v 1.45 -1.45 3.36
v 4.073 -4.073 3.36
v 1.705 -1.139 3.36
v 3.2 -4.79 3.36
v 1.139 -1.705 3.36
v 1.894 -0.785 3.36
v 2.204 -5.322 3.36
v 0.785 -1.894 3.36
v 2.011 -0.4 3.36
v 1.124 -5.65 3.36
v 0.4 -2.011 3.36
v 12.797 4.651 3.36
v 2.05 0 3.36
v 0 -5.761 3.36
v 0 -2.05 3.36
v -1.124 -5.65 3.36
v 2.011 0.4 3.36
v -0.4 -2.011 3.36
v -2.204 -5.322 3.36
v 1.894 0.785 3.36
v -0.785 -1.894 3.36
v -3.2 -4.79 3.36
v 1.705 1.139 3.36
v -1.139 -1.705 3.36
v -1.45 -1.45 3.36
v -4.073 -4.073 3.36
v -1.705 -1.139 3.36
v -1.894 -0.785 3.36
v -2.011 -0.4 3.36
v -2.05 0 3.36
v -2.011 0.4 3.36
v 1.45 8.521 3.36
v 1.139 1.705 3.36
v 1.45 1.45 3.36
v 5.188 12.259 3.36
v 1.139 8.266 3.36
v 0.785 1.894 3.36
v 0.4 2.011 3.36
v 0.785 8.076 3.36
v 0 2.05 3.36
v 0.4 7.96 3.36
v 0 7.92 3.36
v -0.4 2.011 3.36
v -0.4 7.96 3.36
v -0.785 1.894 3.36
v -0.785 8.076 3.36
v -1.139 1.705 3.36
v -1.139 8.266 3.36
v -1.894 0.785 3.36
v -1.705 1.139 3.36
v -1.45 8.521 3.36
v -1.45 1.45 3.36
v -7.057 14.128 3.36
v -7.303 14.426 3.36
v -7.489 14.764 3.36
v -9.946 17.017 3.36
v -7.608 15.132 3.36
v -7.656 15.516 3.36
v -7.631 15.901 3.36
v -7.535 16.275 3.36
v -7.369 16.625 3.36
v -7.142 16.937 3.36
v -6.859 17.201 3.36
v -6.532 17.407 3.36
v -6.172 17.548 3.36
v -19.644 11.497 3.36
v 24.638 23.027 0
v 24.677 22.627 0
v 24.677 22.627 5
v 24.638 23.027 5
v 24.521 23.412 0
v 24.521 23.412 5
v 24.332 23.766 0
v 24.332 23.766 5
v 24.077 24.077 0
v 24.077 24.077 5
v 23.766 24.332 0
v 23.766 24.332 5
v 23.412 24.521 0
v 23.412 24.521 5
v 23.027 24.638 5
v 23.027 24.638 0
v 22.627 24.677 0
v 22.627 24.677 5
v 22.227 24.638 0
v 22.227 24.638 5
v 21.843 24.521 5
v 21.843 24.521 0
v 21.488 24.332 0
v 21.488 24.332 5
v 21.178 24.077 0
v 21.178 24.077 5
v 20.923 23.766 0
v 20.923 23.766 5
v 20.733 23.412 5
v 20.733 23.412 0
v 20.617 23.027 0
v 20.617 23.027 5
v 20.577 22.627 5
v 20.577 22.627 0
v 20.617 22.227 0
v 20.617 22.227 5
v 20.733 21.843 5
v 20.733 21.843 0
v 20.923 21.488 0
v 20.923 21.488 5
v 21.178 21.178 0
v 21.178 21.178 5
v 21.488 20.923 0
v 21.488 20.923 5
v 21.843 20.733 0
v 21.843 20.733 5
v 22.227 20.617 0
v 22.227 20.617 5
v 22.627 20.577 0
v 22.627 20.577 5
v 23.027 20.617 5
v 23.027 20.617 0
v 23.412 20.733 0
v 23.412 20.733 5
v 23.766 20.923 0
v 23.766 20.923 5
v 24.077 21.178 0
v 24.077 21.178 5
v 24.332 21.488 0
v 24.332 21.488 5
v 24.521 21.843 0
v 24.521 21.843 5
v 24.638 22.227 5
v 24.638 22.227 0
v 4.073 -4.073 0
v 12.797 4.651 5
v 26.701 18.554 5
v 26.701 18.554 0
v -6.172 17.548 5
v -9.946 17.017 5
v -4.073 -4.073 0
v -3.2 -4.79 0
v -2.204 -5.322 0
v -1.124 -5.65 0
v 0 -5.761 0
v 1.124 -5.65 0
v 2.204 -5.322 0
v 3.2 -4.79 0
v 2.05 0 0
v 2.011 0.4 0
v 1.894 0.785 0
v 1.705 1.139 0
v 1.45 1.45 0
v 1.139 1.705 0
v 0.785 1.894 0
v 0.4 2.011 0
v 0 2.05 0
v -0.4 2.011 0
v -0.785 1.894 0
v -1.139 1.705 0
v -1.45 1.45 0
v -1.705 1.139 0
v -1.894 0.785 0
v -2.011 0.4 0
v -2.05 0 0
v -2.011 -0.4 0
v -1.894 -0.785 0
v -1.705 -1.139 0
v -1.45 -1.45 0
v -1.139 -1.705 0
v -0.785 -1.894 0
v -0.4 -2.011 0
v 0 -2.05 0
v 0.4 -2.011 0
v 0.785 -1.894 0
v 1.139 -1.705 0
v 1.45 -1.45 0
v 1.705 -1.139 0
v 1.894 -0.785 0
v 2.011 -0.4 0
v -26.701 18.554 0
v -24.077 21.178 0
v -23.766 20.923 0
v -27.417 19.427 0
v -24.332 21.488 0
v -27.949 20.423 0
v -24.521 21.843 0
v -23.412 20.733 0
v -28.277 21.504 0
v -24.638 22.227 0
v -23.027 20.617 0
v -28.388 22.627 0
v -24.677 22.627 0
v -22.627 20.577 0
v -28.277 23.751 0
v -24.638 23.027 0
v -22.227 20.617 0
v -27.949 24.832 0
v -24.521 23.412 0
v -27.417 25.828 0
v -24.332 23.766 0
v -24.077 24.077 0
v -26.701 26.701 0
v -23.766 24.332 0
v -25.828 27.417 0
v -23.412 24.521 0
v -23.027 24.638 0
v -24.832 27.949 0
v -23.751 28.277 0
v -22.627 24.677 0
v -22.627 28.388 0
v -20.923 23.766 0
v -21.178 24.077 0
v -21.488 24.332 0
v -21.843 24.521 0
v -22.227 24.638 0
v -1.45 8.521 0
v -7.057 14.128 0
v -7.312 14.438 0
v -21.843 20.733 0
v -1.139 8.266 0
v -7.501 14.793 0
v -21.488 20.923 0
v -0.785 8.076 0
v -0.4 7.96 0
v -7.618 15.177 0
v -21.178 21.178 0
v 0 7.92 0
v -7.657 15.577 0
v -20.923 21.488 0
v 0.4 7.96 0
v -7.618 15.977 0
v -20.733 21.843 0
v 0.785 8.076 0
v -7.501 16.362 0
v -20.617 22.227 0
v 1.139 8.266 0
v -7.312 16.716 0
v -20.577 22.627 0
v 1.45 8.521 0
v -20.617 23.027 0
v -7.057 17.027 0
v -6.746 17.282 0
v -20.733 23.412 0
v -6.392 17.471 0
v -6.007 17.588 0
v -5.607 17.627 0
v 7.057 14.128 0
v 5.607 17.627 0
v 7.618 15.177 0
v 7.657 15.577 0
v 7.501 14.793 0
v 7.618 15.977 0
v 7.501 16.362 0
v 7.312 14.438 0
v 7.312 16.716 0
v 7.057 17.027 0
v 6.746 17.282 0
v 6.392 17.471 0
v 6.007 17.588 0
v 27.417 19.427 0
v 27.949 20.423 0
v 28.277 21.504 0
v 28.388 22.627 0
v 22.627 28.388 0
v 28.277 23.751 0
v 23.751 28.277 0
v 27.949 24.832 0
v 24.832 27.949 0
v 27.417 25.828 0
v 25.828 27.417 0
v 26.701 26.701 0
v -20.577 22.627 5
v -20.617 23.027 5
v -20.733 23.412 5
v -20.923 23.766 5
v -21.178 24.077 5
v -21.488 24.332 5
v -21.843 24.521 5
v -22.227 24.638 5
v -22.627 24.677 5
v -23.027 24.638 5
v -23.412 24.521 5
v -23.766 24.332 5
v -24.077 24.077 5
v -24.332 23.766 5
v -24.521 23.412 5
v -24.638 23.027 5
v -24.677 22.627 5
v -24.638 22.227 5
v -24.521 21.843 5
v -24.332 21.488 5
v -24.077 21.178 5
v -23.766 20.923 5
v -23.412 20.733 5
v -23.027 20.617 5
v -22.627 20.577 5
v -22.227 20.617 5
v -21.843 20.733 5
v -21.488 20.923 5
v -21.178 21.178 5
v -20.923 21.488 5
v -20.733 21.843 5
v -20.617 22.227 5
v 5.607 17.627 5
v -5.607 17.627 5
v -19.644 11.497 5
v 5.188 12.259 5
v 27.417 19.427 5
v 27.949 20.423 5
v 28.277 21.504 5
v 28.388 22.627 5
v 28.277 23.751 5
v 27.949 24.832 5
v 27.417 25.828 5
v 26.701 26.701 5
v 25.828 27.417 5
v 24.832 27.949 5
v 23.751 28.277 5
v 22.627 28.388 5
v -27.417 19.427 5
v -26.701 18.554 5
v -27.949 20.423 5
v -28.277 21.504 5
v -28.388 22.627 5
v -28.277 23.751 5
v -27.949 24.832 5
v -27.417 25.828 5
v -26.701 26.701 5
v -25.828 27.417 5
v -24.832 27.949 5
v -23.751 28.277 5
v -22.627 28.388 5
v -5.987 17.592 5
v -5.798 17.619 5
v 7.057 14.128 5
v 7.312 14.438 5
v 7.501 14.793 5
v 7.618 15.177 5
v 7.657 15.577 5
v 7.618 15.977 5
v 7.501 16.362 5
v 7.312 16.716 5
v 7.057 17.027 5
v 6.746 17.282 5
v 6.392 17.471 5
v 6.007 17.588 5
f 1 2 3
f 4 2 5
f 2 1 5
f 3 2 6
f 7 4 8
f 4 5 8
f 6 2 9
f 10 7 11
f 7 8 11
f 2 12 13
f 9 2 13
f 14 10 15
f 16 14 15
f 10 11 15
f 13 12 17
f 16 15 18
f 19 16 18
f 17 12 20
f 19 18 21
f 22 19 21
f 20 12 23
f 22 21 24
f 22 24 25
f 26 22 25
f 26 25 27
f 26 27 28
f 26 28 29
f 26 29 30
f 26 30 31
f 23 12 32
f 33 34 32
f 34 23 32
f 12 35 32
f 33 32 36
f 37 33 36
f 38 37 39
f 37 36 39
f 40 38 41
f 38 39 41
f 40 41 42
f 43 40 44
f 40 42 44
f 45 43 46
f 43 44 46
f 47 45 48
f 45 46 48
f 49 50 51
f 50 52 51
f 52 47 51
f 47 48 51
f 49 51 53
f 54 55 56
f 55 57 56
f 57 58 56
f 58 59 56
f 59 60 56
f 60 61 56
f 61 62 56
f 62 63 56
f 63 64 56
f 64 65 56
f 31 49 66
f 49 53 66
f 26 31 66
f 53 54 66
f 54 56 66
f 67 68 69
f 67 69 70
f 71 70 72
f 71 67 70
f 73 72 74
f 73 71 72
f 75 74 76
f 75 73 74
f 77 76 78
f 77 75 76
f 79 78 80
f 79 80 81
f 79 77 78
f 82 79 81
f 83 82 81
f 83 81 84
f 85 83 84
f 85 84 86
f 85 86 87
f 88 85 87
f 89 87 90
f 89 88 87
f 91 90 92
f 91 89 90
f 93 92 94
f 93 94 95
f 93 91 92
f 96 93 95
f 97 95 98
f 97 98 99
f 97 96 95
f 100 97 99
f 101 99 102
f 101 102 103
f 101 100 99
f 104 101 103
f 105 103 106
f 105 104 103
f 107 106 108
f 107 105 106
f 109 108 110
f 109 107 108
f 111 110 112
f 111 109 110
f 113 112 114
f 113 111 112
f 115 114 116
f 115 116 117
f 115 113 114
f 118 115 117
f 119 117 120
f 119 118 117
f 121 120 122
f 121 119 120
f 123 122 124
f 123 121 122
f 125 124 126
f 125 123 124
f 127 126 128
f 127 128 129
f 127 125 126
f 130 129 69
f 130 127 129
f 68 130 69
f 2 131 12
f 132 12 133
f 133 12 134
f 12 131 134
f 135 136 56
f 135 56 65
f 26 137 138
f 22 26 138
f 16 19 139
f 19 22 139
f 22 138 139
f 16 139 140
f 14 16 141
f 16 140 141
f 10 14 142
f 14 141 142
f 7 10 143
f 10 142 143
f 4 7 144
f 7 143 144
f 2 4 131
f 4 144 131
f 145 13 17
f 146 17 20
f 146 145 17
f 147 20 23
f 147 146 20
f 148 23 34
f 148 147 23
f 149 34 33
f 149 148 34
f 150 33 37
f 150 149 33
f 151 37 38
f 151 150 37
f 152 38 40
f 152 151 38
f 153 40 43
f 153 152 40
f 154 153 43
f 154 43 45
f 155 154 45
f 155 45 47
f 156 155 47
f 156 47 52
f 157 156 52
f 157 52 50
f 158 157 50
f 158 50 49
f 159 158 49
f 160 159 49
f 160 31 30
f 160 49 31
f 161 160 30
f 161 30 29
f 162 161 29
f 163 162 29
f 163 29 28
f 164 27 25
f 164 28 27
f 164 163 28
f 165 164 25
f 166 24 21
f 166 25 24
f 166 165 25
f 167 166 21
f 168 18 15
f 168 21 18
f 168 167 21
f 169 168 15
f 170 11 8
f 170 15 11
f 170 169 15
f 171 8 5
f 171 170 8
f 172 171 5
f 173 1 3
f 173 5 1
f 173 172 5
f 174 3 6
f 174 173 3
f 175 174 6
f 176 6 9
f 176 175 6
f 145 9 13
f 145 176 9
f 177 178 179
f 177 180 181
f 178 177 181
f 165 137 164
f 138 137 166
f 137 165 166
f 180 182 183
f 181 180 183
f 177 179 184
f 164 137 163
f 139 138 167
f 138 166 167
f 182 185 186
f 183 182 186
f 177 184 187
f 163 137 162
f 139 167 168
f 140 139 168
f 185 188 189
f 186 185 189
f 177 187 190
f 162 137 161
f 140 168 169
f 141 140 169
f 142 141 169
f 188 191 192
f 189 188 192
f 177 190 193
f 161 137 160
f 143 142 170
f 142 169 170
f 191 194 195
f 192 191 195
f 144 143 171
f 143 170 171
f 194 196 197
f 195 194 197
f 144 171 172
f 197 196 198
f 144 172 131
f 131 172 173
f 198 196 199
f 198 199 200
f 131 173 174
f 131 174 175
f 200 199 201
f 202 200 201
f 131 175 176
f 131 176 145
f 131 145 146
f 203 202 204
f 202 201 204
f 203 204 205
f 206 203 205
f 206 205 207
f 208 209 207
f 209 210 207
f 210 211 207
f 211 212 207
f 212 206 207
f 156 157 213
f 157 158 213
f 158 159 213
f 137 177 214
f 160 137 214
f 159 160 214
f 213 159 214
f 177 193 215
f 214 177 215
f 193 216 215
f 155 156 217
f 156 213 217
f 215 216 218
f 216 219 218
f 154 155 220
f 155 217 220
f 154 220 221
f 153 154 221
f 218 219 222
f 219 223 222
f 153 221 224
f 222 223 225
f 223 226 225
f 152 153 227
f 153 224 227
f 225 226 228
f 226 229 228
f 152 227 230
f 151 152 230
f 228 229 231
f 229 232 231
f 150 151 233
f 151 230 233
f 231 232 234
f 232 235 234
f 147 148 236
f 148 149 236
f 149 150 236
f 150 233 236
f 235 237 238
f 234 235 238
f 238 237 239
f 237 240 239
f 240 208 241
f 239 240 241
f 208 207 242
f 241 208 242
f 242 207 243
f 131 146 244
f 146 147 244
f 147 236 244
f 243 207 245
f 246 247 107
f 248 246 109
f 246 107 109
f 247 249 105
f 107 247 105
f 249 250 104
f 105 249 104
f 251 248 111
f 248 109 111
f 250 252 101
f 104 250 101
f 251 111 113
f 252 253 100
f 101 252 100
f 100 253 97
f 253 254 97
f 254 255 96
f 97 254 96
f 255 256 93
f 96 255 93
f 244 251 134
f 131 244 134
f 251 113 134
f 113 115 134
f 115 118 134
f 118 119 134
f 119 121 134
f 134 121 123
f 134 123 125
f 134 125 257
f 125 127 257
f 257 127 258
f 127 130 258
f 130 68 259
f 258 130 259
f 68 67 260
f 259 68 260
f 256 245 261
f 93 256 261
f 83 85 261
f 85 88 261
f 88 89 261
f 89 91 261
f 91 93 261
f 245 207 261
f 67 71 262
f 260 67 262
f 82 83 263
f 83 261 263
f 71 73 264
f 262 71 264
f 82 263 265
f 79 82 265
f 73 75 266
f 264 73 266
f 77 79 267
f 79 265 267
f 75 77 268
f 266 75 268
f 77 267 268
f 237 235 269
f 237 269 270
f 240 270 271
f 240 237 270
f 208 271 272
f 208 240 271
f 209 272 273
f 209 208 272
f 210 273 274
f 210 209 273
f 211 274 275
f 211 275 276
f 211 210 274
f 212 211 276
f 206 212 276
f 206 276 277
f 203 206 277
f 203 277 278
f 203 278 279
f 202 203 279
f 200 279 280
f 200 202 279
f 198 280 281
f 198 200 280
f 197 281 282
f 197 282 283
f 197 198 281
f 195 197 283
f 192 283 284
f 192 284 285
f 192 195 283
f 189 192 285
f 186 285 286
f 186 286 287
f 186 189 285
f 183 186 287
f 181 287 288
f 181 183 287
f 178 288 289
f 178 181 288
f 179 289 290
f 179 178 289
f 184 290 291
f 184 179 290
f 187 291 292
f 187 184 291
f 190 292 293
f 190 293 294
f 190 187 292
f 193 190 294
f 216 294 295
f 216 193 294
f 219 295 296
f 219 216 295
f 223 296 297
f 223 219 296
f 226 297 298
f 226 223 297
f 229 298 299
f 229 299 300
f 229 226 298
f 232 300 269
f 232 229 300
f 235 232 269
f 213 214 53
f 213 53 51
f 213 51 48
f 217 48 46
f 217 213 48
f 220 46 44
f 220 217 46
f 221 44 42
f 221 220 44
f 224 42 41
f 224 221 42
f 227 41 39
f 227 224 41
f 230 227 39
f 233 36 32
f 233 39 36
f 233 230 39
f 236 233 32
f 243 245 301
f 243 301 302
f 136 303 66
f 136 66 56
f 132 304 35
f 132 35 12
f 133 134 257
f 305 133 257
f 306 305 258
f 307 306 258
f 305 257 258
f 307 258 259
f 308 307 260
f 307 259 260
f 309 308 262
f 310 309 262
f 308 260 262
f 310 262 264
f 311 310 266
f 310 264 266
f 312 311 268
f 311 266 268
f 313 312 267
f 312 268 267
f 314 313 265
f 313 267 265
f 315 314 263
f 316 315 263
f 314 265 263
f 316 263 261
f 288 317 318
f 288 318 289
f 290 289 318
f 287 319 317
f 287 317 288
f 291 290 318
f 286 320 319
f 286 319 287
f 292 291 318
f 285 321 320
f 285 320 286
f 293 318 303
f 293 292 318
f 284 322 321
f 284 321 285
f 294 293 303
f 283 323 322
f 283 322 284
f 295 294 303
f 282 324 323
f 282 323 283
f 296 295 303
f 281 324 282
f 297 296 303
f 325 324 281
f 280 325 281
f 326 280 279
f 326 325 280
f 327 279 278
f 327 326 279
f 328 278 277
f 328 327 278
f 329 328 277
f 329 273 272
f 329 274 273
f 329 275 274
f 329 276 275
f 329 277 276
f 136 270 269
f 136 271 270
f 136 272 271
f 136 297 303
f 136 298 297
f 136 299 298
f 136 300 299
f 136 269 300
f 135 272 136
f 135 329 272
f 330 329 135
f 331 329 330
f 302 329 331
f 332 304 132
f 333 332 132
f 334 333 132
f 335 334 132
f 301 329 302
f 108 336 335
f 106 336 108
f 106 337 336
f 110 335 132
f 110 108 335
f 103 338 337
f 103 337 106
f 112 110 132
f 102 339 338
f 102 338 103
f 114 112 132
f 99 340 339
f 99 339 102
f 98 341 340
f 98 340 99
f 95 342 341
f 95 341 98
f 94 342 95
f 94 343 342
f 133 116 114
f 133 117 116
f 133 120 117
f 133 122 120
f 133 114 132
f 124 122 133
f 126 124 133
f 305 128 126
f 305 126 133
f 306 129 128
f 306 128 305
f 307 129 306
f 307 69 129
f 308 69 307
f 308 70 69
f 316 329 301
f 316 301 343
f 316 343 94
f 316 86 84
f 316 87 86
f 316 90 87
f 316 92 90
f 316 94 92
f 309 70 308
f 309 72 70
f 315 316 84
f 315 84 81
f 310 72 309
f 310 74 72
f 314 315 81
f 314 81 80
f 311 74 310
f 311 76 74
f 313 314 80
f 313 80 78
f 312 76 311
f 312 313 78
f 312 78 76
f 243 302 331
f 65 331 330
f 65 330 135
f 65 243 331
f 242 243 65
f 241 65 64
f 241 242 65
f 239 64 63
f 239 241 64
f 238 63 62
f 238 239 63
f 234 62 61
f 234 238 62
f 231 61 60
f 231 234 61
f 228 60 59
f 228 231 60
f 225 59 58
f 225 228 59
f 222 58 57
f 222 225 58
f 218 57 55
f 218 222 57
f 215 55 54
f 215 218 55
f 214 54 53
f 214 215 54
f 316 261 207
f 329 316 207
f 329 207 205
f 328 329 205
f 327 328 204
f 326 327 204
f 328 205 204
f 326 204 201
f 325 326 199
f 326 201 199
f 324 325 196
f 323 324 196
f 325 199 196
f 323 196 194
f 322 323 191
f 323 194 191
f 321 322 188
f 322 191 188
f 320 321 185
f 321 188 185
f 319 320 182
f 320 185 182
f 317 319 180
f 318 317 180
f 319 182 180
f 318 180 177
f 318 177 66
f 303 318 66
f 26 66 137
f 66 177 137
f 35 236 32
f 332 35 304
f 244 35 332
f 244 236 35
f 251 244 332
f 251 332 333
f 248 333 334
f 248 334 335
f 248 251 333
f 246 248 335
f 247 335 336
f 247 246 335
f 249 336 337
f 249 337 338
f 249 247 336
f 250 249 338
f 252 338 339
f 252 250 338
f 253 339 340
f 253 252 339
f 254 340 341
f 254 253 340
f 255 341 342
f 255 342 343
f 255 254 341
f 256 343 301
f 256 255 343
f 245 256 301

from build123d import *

# Parameters (mm, degrees)
SCHIZZO1_R                   = 2.05
ESTRUSIONE_ESTRUSIONE1_DEPTH = 5
CUT_EXTRUDE2_DEPTH           = 1.64


with BuildPart() as part:
    # Schizzo1 → Estrusione-Estrusione1 (new body)
    with BuildSketch(Plane.XY):
        with BuildLine():
            Line((22.627416998, 28.387976608), (-22.627416998, 28.387976608))
            ThreePointArc((-22.627416998, 28.387976608), (-27.949480117, 24.831887722), (-26.700747761, 18.554086235))
            Line((-26.700747761, 18.554086235), (-4.073330763, -4.073330763))
            ThreePointArc((-4.073330763, -4.073330763), (0, -5.76055961), (4.073330763, -4.073330763))
            Line((4.073330763, -4.073330763), (26.700747761, 18.554086235))
            ThreePointArc((26.700747761, 18.554086235), (27.949480117, 24.831887722), (22.627416998, 28.387976608))
        make_face()
        Circle(SCHIZZO1_R, mode=Mode.SUBTRACT)
        with Locations((22.627416998, 22.627416998)):
            Circle(SCHIZZO1_R, mode=Mode.SUBTRACT)
        with Locations((-22.627416998, 22.627416998)):
            Circle(SCHIZZO1_R, mode=Mode.SUBTRACT)
        with BuildLine():
            Line((5.607211383, 17.627416998), (-5.607211383, 17.627416998))
            ThreePointArc((-5.607211383, 17.627416998), (-7.501164425, 16.361918034), (-7.056780285, 14.127848097))
            Line((-7.056780285, 14.127848097), (-1.449568901, 8.520636713))
            ThreePointArc((-1.449568901, 8.520636713), (0, 7.920205615), (1.449568901, 8.520636713))
            Line((1.449568901, 8.520636713), (7.056780285, 14.127848097))
            ThreePointArc((7.056780285, 14.127848097), (7.501164425, 16.361918034), (5.607211383, 17.627416998))
        make_face(mode=Mode.SUBTRACT)
    extrude(amount=ESTRUSIONE_ESTRUSIONE1_DEPTH)

    # Sketch2 → Cut-Extrude2 (cut)
    with BuildSketch(Plane.XY.offset(5)):
        Polygon((12.797266468, 4.650604941), (0, -8.146661527), (-19.643815137, 11.49715361), (-9.946322881, 17.017390693), (-5.607211383, 17.627416998), (-1.449568901, 8.520636713), (1.449568901, 8.520636713), (5.188401798, 12.25946961), align=None)
    extrude(amount=-CUT_EXTRUDE2_DEPTH, mode=Mode.SUBTRACT)


solid = part.part
